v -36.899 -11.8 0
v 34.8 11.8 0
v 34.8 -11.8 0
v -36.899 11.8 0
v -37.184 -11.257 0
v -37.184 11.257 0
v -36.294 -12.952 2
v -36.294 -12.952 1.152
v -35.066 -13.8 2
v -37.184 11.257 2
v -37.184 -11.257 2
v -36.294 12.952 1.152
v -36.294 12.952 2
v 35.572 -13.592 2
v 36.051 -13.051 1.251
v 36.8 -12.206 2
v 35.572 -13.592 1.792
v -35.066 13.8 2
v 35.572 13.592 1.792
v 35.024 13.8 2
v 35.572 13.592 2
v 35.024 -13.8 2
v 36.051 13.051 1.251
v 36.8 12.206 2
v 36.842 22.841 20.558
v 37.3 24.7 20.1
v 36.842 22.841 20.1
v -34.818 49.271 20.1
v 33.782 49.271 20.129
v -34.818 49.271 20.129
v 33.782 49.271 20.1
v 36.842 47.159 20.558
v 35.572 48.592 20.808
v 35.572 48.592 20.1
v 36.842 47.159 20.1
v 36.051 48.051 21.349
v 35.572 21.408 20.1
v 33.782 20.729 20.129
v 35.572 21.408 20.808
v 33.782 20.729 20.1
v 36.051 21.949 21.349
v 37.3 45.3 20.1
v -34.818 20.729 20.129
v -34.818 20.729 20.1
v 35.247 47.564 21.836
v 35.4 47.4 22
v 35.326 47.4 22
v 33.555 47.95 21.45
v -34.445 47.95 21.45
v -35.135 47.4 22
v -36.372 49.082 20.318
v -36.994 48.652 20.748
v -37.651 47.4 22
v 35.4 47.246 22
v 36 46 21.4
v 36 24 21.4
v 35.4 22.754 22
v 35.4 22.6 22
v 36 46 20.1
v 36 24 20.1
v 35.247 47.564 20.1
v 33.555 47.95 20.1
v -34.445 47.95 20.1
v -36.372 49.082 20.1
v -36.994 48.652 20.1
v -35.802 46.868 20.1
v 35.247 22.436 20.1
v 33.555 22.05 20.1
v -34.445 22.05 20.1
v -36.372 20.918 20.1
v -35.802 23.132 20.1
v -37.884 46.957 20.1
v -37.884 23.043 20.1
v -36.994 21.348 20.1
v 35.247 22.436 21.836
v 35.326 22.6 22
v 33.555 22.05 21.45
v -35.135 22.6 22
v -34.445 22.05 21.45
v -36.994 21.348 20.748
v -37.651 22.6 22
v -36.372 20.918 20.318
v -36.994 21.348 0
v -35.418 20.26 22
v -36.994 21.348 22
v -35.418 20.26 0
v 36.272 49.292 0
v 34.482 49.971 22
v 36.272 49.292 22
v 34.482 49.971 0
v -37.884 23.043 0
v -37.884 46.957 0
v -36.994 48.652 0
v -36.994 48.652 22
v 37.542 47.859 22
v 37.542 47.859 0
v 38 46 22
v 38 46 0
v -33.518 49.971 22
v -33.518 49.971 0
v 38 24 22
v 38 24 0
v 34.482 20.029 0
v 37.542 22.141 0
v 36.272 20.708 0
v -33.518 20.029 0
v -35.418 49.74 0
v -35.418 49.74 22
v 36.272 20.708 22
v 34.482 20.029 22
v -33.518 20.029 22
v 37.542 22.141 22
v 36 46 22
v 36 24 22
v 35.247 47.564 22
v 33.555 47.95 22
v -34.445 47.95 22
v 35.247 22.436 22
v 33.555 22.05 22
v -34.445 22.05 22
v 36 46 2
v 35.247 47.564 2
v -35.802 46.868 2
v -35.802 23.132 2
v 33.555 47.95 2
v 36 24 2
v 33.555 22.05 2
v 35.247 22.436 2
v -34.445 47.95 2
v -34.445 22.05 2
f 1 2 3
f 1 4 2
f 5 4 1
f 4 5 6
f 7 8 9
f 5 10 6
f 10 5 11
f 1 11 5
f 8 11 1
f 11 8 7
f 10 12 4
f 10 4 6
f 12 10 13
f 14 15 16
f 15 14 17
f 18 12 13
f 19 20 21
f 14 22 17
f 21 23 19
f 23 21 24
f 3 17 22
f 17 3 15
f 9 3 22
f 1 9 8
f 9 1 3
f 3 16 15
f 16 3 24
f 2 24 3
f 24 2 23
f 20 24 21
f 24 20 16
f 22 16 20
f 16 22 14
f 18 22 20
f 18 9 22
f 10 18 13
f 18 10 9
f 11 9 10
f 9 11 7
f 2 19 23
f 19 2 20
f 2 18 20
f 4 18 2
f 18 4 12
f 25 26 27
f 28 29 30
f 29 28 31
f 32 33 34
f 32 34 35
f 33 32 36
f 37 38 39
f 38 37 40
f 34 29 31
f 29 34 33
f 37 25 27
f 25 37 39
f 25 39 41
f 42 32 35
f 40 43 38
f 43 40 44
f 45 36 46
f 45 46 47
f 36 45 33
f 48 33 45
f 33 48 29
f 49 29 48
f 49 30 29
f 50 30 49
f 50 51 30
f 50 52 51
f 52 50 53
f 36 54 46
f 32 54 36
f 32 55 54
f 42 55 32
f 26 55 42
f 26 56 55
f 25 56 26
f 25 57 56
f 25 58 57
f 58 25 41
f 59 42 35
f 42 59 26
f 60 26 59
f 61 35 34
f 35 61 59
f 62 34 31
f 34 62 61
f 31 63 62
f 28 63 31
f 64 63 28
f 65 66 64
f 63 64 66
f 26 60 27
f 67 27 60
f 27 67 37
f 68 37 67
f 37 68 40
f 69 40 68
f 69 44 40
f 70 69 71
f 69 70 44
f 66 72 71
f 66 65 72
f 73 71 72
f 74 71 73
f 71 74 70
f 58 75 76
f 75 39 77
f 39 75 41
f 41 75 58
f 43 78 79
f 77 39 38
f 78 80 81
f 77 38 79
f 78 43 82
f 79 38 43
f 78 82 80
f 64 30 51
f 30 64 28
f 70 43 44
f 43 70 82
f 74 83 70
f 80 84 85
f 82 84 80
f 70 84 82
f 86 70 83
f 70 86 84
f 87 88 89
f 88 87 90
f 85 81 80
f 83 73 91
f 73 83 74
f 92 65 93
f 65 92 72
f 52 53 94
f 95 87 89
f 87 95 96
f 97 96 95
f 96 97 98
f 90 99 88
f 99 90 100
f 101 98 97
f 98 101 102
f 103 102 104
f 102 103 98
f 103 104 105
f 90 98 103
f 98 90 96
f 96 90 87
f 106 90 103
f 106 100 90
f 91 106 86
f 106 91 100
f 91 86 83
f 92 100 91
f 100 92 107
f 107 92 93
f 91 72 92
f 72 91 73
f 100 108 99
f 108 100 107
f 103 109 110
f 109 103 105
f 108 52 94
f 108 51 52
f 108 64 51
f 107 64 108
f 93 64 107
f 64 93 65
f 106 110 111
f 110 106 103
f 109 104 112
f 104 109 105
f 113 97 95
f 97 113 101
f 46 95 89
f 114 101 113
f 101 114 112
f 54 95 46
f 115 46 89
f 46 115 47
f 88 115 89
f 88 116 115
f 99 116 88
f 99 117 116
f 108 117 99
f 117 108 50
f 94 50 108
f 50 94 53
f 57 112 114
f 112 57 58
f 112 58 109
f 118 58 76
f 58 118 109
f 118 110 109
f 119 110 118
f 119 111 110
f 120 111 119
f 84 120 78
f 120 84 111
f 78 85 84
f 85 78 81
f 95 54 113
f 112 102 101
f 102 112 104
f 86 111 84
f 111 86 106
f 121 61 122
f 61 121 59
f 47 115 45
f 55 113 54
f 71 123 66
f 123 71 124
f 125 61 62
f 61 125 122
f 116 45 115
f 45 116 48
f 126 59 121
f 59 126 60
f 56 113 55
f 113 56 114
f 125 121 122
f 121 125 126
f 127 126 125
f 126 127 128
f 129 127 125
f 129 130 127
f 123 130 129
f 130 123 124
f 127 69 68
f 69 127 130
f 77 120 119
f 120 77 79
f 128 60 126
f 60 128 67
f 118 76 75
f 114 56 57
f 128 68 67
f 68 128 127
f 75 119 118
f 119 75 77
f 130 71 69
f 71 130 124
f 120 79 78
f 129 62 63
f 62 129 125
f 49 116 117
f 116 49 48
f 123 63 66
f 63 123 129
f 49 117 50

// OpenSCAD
//parametic rounded sliding lid & box
//john finch 12-1-13


//User Inputs
width = 30;
len = 76;
height =22;
thickness = 2;
min_wall = 0.7; //remaining wall thickness inside lid groove
radius = 4; // .1 to say 10
//End of user inputs

x1 = len/2;
y1 = width/2;
z1 = 0;


x2 = x1 - thickness;
y2 = y1 - thickness;
z2 = z1 + thickness;

echo (x1,x2,y1,y2);




module roundedRect(size, radius)  //modified William A Adams roundedrect.scad
{
x = size[0];
y = size[1];
z = size[2];


echo (x, y, z, radius);

linear_extrude(height=z)
hull()
{
// place 4 circles in the corners, with the given radius
translate([(-x/2)+(radius), (-y/2)+(radius), 0])
circle(r=radius);

translate([(x/2)-(radius), (-y/2)+(radius), 0])
circle(r=radius);

translate([(-x/2)+(radius), (y/2)-(radius), 0])
circle(r=radius);

translate([(x/2)-(radius), (y/2)-(radius), 0])
circle(r=radius);
}
}
module lid_trimmer(){
difference(){
	translate([-(len+5)/2,-(width+5)/2,0])
	cube([len+5,width+5,thickness+5]);
	roundedRect([len-2*min_wall,width-2*min_wall,thickness+5],radius);
	}

}

module lid(adjust){

difference(){
	polyhedron ( 
				points = [	[-x1,-y2+min_wall+adjust,0], 
							[x2-min_wall-adjust,-y2+min_wall+adjust,0],
							[x2-min_wall-adjust,y2-min_wall-adjust,0], 
							[-x1,y2-min_wall-adjust,0],
							[-x1,-y1+min_wall+adjust,z2],
							[x1-min_wall-adjust,-y1+min_wall+adjust,z2], 
							[x1-min_wall-adjust,y1-min_wall-adjust,z2], 
							[-x1,y1-min_wall-adjust,z2]], 

			triangles = [	[0,5,1], 
							[5,0,4], 
							[1,6,2], 
							[1,5,6], 
							[6,3,2], 
							[6,7,3], 
							[7,0	,3], 
							[4,0,7], 
							[4,6,5], 
							[6,4,7], 
							[0,1,2], 
							[0,2,3]]);
	lid_trimmer();
	}
}

module box() {
difference(){
	
	translate([0,5+width,0])
	roundedRect([len,width,height],radius);

	
	translate([0,5+width,thickness])
	roundedRect([len-2*thickness,width-2*thickness,height],radius-thickness);
	
	translate([0,5+width,height+.1])
	rotate([180,0,0])
	lid(0);
	//cut slot end open
	translate([-thickness,5+width,height+.1])
	rotate([180,0,0])
	lid(0);

	}
	/*
	translate([0,5+width,height+.1])
	rotate([180,0,0])
	lid(.5);
	*/

}

//print lid undersized in length by .5mm and width by 1.0 mm

lid(.5);
	
//lid_trimmer();
box();
